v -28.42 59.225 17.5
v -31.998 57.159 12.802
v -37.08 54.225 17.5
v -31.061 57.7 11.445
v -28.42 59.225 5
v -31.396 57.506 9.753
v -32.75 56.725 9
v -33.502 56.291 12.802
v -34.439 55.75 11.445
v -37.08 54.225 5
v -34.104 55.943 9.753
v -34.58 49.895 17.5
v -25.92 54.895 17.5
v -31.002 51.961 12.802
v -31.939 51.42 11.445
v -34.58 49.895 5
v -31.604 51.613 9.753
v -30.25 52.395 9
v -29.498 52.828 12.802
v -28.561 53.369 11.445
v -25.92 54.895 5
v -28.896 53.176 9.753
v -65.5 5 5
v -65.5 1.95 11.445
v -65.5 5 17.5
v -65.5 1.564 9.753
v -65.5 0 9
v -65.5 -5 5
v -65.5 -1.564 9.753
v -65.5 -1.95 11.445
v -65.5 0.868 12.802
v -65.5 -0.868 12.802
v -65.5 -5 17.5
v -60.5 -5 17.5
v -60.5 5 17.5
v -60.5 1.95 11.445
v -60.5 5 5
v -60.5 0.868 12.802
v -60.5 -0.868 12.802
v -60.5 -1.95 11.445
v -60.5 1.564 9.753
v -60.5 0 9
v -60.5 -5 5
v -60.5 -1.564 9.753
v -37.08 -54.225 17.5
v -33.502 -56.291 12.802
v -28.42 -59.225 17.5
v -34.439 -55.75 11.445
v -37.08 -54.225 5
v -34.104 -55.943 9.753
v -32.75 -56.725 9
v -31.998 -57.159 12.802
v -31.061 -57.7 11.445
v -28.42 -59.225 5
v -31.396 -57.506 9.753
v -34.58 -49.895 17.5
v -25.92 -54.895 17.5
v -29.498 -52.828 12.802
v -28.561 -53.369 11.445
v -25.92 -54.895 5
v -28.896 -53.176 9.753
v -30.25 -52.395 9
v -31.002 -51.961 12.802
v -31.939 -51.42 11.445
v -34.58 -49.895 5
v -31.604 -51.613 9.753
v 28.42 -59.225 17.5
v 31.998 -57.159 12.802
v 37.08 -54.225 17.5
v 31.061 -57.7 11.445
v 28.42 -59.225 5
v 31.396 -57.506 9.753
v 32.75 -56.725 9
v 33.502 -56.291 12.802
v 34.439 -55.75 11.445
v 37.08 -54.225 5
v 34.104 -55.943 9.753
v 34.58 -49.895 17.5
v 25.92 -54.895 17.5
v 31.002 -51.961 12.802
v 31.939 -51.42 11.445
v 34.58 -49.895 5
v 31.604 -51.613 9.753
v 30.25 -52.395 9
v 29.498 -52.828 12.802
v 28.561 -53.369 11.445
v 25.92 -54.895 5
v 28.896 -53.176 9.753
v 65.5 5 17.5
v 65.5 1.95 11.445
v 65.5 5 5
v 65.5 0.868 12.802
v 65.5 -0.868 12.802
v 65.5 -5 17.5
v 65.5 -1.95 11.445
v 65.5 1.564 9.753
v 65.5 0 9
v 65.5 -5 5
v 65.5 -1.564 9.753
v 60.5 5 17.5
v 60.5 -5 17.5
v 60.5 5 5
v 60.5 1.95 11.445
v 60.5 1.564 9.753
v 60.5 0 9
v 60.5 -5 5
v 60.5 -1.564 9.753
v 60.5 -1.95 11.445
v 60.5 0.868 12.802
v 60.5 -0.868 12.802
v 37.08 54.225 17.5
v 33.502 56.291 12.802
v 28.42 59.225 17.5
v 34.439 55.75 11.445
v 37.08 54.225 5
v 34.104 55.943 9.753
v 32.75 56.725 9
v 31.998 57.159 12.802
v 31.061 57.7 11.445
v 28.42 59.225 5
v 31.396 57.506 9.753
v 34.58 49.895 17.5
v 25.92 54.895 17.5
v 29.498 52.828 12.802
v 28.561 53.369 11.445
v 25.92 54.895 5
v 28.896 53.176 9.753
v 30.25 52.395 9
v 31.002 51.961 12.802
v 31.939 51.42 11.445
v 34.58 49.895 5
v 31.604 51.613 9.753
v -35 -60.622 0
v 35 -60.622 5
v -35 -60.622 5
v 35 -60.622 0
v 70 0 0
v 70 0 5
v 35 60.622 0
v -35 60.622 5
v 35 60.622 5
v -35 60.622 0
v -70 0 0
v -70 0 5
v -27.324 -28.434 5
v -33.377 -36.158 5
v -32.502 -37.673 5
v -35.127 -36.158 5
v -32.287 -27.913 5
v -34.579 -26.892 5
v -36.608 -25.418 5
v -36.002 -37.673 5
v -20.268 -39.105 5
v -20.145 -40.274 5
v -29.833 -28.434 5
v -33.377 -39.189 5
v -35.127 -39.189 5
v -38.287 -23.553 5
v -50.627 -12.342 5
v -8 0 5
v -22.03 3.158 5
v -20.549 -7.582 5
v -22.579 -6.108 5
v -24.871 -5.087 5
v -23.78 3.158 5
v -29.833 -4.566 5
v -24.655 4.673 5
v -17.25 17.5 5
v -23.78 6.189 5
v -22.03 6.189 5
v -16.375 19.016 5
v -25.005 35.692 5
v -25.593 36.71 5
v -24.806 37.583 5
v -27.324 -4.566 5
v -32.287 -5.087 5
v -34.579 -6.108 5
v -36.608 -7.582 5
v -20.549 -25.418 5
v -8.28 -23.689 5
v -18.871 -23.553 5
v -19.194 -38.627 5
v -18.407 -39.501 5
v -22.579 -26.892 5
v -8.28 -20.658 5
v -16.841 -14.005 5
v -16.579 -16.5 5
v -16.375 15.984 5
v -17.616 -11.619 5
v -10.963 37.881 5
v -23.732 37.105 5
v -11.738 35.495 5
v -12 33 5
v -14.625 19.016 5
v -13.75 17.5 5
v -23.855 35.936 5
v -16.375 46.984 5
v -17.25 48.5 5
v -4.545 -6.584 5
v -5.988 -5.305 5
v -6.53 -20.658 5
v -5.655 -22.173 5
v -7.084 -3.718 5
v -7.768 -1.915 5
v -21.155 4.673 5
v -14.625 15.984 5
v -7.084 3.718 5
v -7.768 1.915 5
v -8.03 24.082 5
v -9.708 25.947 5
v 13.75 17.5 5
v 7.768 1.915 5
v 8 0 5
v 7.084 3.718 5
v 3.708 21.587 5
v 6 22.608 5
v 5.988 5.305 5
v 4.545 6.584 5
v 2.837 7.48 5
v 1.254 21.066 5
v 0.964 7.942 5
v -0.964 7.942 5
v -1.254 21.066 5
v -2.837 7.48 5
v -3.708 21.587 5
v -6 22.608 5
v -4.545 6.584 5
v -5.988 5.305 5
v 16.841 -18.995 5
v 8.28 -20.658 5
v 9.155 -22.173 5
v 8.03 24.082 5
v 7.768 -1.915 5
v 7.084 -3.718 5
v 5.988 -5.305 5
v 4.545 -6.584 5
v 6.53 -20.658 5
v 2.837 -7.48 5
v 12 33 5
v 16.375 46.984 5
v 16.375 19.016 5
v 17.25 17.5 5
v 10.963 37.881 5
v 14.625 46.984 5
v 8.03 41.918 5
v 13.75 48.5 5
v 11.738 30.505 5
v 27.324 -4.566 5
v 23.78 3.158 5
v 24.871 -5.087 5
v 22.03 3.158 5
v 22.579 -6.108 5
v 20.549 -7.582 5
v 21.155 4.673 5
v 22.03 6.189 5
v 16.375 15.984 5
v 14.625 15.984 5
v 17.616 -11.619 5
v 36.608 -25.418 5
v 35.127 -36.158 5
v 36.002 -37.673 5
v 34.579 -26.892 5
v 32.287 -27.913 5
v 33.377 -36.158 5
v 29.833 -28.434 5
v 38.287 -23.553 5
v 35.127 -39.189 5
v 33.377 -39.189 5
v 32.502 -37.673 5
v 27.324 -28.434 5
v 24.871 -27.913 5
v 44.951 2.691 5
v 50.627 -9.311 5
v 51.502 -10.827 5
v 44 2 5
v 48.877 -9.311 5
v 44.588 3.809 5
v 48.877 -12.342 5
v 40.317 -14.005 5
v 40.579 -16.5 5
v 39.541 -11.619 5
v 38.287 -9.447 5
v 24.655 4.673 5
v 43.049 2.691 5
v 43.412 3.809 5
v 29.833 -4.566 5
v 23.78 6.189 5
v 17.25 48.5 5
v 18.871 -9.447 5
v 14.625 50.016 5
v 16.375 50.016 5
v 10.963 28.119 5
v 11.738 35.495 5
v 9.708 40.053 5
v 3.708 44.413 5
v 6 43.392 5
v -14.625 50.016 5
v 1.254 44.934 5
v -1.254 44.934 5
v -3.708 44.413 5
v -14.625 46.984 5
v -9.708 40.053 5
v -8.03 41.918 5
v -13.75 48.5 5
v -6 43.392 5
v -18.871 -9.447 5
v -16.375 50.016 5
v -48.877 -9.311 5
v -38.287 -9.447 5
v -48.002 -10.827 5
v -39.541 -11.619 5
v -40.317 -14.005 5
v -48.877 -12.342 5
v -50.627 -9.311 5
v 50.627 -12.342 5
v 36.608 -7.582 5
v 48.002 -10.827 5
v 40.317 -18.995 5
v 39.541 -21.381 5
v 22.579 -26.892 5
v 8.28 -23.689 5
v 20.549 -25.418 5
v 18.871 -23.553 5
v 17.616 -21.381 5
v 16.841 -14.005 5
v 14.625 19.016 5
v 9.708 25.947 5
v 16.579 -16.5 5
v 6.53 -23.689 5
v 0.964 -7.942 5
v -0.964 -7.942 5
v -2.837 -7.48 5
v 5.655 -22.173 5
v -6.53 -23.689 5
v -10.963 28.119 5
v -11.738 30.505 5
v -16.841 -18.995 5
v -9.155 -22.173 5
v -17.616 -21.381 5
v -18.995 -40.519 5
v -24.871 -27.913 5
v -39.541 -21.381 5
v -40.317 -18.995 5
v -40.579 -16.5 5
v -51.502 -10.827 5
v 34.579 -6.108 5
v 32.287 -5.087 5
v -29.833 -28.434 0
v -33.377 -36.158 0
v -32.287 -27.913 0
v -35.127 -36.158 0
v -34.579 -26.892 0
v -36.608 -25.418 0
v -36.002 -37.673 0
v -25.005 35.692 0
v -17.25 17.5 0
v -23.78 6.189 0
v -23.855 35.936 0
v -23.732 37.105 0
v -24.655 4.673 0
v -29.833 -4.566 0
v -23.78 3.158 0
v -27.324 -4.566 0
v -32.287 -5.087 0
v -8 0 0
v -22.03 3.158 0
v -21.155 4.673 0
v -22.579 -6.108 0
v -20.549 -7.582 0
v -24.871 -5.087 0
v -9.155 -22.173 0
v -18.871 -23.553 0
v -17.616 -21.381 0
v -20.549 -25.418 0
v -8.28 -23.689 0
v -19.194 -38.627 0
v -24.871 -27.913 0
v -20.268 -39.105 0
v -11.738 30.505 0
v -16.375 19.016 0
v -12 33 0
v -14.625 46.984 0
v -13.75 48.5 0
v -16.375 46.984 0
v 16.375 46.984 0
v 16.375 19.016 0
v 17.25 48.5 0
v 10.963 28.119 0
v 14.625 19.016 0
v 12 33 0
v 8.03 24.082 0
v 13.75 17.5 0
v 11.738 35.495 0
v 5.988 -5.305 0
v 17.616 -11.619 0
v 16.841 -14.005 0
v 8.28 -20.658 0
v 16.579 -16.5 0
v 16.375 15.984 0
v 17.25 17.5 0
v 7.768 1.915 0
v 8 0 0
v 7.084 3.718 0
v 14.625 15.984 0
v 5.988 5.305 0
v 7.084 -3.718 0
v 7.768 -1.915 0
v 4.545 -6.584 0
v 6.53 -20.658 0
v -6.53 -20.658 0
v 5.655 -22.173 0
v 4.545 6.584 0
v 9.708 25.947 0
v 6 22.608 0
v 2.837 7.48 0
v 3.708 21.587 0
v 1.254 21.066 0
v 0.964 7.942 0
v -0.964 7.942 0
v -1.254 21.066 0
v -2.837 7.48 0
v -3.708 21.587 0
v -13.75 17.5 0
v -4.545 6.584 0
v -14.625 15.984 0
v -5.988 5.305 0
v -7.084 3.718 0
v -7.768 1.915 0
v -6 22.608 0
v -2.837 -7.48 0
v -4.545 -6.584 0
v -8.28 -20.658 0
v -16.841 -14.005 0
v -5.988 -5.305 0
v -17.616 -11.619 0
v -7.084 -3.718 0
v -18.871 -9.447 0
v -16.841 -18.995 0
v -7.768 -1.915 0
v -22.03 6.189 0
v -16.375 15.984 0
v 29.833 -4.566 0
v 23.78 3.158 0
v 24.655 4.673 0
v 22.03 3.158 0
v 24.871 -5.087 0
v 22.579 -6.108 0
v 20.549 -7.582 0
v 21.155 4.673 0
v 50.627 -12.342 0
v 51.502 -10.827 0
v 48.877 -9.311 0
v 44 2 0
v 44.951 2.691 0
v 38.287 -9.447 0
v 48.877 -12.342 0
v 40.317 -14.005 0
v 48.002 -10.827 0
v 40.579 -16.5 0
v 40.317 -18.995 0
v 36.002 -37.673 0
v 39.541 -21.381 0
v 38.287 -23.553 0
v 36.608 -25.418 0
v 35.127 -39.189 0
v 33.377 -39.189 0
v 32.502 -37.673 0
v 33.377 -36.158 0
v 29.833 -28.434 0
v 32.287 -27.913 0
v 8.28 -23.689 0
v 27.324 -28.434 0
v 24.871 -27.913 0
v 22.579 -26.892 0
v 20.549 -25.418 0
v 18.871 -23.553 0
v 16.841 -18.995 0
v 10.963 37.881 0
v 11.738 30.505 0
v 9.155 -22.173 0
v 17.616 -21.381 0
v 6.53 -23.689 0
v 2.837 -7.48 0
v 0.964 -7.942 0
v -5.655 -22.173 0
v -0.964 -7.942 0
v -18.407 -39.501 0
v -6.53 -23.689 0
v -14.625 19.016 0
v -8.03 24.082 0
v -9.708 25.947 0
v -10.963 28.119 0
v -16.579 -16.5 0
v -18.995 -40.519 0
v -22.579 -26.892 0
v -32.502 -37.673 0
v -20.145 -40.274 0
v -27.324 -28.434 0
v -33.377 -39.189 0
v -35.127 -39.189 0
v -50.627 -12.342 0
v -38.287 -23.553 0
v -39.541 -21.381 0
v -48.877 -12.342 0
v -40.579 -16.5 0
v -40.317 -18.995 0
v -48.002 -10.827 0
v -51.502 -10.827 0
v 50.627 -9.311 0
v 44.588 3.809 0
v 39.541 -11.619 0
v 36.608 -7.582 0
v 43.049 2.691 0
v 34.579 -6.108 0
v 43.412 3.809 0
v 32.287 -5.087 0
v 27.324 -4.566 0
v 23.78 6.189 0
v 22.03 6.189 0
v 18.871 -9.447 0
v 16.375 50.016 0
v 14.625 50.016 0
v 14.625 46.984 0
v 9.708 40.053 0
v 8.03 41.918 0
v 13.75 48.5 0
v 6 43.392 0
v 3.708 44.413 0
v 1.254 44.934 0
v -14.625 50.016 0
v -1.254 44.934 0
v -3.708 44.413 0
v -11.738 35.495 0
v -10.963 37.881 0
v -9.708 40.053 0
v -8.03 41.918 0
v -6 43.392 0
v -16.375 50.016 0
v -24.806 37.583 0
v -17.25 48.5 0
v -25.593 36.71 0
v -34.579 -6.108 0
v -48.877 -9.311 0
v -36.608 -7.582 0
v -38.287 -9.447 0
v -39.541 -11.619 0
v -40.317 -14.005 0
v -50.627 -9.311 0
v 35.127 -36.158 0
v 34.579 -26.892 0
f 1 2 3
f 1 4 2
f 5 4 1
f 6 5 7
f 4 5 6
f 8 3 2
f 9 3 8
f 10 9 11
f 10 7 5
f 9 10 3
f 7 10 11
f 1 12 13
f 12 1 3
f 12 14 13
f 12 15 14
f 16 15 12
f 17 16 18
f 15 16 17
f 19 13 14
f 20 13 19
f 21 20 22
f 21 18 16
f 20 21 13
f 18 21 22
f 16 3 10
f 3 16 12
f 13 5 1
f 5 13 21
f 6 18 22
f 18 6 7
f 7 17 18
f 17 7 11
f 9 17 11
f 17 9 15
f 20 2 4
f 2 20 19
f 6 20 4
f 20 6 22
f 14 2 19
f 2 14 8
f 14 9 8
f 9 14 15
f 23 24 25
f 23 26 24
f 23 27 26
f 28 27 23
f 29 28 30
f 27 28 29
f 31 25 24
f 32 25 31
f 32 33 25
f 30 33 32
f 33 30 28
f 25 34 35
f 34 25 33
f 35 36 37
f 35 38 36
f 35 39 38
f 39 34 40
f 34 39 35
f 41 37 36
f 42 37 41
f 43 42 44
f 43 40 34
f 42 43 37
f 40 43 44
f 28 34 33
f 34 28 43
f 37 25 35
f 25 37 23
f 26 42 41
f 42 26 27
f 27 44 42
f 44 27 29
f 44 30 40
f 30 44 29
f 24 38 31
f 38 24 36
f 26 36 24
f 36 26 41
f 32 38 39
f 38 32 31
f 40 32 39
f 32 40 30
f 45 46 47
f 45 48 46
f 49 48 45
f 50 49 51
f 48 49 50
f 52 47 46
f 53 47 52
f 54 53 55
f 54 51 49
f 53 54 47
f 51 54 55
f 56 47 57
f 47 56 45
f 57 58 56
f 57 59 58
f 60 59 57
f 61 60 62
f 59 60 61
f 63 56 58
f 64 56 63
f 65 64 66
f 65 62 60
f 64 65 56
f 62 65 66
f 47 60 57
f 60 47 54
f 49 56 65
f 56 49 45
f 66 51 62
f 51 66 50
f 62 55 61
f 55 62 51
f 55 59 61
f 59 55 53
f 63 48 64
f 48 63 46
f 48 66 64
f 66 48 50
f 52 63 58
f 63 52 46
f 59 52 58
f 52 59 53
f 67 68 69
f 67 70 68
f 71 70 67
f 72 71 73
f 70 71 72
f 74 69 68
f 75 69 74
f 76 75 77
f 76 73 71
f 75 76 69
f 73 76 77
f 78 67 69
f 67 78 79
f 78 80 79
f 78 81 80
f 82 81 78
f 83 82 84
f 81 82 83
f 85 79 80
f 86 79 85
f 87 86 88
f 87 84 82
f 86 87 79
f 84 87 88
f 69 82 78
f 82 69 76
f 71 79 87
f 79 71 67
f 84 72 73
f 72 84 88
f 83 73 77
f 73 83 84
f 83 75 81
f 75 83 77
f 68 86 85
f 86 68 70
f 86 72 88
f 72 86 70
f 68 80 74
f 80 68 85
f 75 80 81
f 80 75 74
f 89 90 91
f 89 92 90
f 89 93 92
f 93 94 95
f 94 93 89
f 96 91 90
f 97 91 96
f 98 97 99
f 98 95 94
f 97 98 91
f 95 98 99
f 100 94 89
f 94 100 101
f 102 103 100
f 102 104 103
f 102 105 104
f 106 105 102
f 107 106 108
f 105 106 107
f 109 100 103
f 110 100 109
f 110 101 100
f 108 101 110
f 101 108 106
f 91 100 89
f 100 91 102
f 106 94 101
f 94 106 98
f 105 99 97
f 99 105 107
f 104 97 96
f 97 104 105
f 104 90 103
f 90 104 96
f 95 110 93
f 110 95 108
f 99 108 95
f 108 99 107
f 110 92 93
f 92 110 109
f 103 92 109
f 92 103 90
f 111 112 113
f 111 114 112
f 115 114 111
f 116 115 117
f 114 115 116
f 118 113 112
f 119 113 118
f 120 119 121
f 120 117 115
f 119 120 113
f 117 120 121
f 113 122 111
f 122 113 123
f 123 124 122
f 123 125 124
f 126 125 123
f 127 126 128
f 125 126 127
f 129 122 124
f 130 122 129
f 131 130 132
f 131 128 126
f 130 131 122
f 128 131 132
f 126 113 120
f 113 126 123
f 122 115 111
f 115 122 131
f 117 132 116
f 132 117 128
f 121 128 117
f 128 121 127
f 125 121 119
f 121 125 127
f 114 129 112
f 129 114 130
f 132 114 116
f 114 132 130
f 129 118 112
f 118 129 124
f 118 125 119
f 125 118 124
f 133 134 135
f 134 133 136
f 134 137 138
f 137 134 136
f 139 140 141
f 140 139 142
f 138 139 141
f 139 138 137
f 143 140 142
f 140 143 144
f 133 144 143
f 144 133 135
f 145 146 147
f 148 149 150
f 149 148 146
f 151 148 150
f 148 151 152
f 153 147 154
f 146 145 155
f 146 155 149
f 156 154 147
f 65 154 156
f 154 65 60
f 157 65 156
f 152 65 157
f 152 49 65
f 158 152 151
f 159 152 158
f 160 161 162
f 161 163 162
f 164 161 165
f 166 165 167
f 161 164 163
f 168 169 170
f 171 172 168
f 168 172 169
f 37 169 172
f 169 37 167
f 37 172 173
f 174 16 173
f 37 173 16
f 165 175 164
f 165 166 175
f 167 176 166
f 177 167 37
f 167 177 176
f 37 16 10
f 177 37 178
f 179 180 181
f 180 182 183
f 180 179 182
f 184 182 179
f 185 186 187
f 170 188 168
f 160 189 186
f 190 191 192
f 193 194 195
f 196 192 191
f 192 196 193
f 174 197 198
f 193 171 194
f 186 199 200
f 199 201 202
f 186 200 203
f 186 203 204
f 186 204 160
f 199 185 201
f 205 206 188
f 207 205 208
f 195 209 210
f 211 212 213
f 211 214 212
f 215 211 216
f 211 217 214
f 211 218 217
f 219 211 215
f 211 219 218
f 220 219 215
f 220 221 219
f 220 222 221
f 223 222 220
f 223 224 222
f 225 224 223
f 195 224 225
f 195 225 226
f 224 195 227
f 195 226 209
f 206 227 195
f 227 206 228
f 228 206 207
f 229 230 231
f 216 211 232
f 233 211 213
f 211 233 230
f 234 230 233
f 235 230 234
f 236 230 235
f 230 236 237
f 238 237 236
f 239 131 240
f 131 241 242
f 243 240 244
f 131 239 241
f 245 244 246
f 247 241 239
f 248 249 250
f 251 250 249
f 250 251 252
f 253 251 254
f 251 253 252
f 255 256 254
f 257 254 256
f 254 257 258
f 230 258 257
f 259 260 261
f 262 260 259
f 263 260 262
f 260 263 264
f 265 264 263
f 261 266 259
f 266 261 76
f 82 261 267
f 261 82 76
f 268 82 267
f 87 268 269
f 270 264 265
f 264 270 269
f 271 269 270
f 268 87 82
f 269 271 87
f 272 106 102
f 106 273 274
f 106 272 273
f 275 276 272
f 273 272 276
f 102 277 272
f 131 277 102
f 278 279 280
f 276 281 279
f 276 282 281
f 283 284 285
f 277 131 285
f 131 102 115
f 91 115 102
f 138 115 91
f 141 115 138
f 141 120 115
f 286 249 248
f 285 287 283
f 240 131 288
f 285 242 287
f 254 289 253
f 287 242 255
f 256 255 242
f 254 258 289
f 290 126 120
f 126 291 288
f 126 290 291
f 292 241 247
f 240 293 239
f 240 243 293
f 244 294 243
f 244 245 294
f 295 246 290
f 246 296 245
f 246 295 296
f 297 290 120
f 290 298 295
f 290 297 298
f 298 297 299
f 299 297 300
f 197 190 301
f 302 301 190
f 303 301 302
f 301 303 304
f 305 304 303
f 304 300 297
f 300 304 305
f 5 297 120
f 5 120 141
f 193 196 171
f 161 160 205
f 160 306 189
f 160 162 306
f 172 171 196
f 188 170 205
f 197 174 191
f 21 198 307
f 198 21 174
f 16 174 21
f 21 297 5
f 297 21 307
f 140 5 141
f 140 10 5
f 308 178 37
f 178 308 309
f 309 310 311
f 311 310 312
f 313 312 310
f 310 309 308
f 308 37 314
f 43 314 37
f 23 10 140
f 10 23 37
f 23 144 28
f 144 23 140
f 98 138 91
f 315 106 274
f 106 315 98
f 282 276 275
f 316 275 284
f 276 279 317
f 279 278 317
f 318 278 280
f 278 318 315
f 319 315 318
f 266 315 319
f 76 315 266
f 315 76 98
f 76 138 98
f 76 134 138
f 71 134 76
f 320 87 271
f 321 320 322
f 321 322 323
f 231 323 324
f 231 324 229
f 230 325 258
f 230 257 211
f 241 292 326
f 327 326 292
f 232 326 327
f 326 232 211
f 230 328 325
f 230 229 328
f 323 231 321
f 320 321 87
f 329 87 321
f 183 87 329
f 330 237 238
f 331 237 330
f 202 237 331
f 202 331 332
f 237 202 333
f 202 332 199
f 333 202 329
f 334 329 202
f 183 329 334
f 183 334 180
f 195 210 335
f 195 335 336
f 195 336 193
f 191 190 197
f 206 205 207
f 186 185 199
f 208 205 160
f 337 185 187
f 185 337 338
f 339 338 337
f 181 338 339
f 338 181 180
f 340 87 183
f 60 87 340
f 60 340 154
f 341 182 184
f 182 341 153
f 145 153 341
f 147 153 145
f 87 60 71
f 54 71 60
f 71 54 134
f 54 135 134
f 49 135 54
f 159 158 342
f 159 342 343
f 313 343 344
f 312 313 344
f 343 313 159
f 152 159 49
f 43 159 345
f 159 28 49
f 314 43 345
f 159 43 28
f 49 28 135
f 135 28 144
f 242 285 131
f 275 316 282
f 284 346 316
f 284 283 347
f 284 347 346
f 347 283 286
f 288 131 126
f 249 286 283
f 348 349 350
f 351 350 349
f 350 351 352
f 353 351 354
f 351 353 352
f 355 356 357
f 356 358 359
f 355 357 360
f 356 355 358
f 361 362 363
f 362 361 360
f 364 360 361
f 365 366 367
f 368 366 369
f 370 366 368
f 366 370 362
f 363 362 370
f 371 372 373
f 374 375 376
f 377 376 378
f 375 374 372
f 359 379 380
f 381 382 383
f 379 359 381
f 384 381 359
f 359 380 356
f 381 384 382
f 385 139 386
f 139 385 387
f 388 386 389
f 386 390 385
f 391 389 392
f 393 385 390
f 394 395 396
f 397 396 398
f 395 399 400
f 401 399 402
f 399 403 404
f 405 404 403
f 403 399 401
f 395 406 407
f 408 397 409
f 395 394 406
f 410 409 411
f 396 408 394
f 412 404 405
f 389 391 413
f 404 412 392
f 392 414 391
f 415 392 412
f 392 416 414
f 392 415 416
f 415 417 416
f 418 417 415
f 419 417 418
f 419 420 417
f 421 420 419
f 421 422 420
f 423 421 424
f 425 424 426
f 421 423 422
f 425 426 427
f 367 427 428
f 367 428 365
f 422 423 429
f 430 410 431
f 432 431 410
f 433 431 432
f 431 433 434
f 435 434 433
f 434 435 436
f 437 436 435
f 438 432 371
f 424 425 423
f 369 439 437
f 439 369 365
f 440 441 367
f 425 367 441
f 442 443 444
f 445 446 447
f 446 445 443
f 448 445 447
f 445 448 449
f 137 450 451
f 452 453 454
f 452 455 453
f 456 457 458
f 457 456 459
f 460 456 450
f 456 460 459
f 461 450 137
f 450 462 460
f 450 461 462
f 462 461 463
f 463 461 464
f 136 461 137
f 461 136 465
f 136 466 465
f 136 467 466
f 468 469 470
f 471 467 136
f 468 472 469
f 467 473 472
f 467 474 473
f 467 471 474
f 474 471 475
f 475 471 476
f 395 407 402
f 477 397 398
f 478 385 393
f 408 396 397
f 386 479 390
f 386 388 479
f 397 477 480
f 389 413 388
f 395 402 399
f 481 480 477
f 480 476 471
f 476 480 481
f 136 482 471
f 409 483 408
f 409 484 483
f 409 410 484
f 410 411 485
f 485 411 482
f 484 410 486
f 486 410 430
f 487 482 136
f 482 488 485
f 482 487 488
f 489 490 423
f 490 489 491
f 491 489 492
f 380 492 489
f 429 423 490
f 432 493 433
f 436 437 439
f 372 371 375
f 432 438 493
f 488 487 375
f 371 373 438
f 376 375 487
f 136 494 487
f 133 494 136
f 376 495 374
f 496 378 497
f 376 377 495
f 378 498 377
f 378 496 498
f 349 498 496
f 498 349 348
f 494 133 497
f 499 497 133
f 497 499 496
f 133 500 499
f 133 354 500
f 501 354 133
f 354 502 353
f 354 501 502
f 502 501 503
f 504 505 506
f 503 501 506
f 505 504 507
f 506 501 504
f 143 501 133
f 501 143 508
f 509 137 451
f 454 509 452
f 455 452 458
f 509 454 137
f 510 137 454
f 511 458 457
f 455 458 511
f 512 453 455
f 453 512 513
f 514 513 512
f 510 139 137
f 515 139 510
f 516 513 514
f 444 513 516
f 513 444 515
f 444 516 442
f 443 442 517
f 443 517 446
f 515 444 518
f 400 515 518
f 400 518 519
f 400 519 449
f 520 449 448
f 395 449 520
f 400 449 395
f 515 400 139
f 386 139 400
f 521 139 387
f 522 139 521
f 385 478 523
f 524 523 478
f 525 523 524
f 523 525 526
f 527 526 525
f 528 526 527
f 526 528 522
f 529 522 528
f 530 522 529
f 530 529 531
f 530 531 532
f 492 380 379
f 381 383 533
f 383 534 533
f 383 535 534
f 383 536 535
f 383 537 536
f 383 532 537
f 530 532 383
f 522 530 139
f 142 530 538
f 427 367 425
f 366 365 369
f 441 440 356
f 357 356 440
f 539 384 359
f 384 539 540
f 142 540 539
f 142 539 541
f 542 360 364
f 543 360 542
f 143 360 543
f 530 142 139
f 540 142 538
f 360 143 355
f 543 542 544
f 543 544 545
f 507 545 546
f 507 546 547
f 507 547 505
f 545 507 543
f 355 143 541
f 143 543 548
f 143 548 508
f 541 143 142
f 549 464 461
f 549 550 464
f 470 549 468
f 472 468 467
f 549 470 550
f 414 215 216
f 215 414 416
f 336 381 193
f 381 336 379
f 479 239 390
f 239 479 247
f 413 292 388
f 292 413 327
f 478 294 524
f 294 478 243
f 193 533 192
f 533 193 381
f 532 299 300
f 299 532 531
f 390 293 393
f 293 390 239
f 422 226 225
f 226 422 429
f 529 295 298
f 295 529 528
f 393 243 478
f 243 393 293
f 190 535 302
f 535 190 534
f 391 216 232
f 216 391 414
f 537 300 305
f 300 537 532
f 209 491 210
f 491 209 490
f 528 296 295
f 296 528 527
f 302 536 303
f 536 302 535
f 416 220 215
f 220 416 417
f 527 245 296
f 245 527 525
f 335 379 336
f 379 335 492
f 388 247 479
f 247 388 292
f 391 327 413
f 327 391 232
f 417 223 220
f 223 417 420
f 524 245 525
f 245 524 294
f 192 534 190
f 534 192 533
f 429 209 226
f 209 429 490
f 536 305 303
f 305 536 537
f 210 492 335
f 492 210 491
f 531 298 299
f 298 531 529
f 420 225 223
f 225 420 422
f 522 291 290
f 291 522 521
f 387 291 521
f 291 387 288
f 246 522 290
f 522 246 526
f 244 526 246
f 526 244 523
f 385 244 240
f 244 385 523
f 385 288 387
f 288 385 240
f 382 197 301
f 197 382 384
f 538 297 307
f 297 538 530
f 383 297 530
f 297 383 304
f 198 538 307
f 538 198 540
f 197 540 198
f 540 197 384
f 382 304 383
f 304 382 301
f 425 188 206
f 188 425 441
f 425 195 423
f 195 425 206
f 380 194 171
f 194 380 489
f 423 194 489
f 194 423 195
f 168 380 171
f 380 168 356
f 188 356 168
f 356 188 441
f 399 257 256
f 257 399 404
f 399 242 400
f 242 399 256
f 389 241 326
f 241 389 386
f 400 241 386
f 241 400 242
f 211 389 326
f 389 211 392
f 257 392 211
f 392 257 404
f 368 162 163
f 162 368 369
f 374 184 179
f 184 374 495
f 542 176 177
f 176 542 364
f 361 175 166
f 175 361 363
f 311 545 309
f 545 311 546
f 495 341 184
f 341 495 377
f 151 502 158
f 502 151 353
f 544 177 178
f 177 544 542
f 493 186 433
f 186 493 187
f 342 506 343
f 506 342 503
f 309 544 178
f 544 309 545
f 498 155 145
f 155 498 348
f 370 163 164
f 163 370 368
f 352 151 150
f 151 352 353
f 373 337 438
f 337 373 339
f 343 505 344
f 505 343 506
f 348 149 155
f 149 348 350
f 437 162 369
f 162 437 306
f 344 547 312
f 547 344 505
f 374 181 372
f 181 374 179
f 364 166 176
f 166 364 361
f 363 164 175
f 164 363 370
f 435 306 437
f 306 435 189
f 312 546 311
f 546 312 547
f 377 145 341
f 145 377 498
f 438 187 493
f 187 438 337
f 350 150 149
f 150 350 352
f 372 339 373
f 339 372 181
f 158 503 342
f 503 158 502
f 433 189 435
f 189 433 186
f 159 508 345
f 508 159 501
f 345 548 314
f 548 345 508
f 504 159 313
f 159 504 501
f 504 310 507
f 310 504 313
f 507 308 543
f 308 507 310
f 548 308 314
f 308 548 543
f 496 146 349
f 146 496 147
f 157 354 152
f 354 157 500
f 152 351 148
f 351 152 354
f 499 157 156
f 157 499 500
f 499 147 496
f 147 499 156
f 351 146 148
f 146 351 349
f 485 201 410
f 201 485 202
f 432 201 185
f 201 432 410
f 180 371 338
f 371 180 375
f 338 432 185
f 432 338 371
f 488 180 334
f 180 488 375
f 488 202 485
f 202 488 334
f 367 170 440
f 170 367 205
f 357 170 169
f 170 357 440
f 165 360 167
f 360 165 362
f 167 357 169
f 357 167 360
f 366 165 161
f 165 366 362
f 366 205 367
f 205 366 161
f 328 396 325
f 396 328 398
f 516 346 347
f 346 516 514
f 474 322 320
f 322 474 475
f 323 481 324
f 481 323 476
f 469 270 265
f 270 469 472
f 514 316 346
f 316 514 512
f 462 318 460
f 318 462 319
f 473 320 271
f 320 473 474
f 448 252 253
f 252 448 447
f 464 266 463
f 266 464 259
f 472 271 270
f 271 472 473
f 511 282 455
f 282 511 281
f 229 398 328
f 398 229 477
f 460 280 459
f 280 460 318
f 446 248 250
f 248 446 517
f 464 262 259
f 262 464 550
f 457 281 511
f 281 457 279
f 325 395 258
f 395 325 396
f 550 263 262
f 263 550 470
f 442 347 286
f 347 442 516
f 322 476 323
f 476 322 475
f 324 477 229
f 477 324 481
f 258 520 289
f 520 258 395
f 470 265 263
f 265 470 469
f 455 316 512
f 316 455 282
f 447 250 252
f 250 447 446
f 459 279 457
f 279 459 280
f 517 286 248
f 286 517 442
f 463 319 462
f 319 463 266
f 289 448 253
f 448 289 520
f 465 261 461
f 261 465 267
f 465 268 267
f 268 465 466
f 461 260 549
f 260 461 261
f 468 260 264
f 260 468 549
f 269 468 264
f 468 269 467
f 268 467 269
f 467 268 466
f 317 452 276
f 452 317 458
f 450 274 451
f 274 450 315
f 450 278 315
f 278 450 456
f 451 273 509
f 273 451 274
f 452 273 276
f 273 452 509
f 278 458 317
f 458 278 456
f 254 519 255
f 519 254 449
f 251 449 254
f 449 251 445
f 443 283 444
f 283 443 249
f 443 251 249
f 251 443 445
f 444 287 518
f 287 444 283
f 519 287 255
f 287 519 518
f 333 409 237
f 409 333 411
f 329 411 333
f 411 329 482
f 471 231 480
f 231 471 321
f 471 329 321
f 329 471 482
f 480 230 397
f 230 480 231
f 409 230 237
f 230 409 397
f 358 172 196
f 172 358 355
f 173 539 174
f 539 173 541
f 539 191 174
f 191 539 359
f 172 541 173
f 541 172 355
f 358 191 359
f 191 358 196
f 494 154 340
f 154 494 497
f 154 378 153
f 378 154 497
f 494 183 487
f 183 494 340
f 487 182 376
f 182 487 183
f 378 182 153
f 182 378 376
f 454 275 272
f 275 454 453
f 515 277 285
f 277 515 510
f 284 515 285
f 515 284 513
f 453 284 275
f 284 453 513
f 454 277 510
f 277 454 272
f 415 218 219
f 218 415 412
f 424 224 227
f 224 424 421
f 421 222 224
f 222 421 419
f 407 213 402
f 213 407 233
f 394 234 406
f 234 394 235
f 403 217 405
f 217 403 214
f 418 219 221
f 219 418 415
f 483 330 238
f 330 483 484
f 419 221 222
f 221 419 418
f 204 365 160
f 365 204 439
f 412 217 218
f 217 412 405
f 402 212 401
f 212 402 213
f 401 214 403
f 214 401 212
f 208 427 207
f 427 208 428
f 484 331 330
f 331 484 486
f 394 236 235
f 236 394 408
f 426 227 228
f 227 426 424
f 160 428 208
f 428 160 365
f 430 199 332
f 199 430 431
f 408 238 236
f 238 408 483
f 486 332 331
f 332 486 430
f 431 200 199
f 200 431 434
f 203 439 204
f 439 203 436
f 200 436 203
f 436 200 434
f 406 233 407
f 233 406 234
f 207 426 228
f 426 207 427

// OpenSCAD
// file: rampsMount.scad
module rampsMount()
{
	translate([6.54, 17.24, 0])
        cylinder(r=3.5, h=3.5);
    translate([54.8, 15.97, 0])
        cylinder(r=3.5, h=3.5);
    translate([6.54, 92.17, 0])
        cylinder(r=3.5, h=3.5);
    translate([54.8, 98.52, 0])
        cylinder(r=3.5, h=3.5);
}
module mountHoles()
{
    translate([6.54, 17.24, -3])
        cylinder(r=1.6, h=20);
    translate([54.8, 15.97, -3])
        cylinder(r=1.6, h=20);
    translate([54.8, 98.52, -3])
        cylinder(r=1.6, h=20);
    translate([6.54, 17.24, -3])
        cylinder(r=3.5, h=3, $fn=6);
    translate([54.8, 15.97, -3])
        cylinder(r=3.5, h=3, $fn=6);
    translate([54.8, 98.52, -3])
        cylinder(r=3.5, h=3, $fn=6);
}
//rampsMount();
//mountHoles();
// file: utl.NEMA.scad
// Model: NEMA23
// Model: NEMA17
// Author: Bogdan Kecman
// Licence: GPL
//
// Usage:
// nema17(1); //nema17 double shaft
//nema17(); //nema17 siingle shaft
// nema23(1, 1); //nema23 double shaft cylinder
// nema23(1); //nema23 double shaft cube
// nema23(); //nema23 single shaft cube
// nema23(0,1); //nema23 single shaft cylinder
//nema17DiffBlock();  //nema 17 block for subtracting to make mounts


module nema23(has_back, is_cylinder){
  mplate = 56.9; //mounting plate width
  mplateH = 5.3; //mounting plate height

  ringR = 38.10 / 2; //ring radius
  ringH = 1.3; //ring thickness

  shaftR = 6.337/2; //shaft radius
  shaftH = 20.6;  //shaft lenght

  bodyL = 46.5; //46.5, 56.1, 77.7, 103.1, ...
  bodyInnerCube = 37.6;

  holeR = 5.21/2;
  holeL = 47.14/2; //distance between hole centres

  difference(){
    union(){
      //mounting plate
      color([0.7,0.7,0.7]) cube(size = [mplate,mplate,mplateH], center = true);
      //ring
      color([0.7,0.7,0.7]) translate(v=[0,0,mplateH/2+ringH/2]) cylinder(r=ringR, h=ringH, center=true);
      //shaft front
      color([0.9,0.9,0.9]) translate(v=[0,0,mplateH/2+ringH+shaftH/2])cylinder(r=shaftR, h=shaftH, center=true);
      if (has_back == 1){
        color([0.9,0.9,0.9])  translate(v=[0,0,0-bodyL-shaftH/2]) cylinder(r=shaftR, h=shaftH, center=true);
      }
      //body
      if (is_cylinder == 1){
        color([0.1,0.1,0.1]) translate(v=[0,0,0-mplateH/2-bodyL/2]) cylinder(r=mplate/2, h=bodyL, center=true);
      }else{
        union(){
          color([0.1,0.1,0.1]) translate(v=[0,0,0-mplateH/2-bodyL/2]) cube(size = [bodyInnerCube, mplate, bodyL], center=true);
          color([0.1,0.1,0.1]) translate(v=[0,0,0-mplateH/2-bodyL/2]) cube(size = [mplate,bodyInnerCube, bodyL], center=true);
        }
      }
    }
    translate(v=[holeL,holeL,0]) cylinder(r = holeR, h = 2*mplateH, center=true);
    translate(v=[-holeL,holeL,0]) cylinder(r = holeR, h = 2*mplateH, center=true);
    translate(v=[-holeL,-holeL,0]) cylinder(r = holeR, h = 2*mplateH, center=true);
    translate(v=[holeL,-holeL,0]) cylinder(r = holeR, h = 2*mplateH, center=true);
  }
  
}

module nema17(has_back, is_cylinder){
  mplate = 42.67; //mounting plate width
  mplateH = 0; //mounting plate height

  ringR = 22 / 2; //ring radius, can be 21.95/2
  ringH = 2; //ring thickness

  shaftR = 5/2; //shaft radius, can be 4.988/2
  shaftH = 20.07;  //shaft lenght

  bodyL = 46.5; //25.3, 33.13, 34.7, 40.9, 47.0, ...

  holeR = 3.5/2; //M3 or M4 or #4-40
  holeL = 31.0/2; //distance between hole centres

  difference(){
    union(){
      //ring
      color([0.7,0.7,0.7]) translate(v=[0,0,ringH/2]) cylinder(r=ringR, h=ringH, center=true);
      //shaft front
      color([0.9,0.9,0.9]) translate(v=[0,0,ringH+shaftH/2])cylinder(r=shaftR, h=shaftH, center=true);
      if (has_back == 1){
        color([0.9,0.9,0.9]) translate(v=[0,0,0-bodyL-shaftH/2]) cylinder(r=shaftR, h=shaftH, center=true);
      }
      //body
      if (is_cylinder == 1){
        color([0.1,0.1,0.1]) translate(v=[0,0,0-bodyL/2]) cylinder(r=mplate/2*1.2, h=bodyL, center=true);
      }else{
        union(){
          color([0.1,0.1,0.1]) translate(v=[0,0,0-bodyL/2]) cube(size = [mplate, mplate, bodyL], center=true);
          color([0.1,0.1,0.1]) translate(v=[0,0,0-bodyL/2]) cube(size = [mplate, mplate, bodyL], center=true);
        }
      }
    }
    translate(v=[holeL,holeL,0-bodyL/2]) cylinder(r = holeR, h = bodyL+10, center=true);
    translate(v=[-holeL,holeL,0-bodyL/2]) cylinder(r = holeR, h = bodyL+10, center=true);
    translate(v=[-holeL,-holeL,0-bodyL/2]) cylinder(r = holeR, h = bodyL+10, center=true);
    translate(v=[holeL,-holeL,0-bodyL/2]) cylinder(r = holeR, h = bodyL+10, center=true);
  }
  
}
module nema17DiffBlock(){
  mplate = 42.67; //mounting plate width
  mplateH = 0; //mounting plate height

  ringR = 22 / 2; //ring radius, can be 21.95/2
  ringH = 2; //ring thickness

  shaftR = 5/2; //shaft radius, can be 4.988/2
  shaftH = 20.07;  //shaft lenght

  bodyL = 46.5; //25.3, 33.13, 34.7, 40.9, 47.0, ...

  holeR = 3.5/2; //M3 or M4 or #4-40
  holeL = 31.0/2; //distance between hole centres

  
  
      //ring
    color([0.7,0.7,0.7]) translate(v=[0,0,ringH/2]) cylinder(r=ringR+1, h=ringH+30, center=true);
      
    translate(v=[holeL,holeL,0-bodyL/2]) cylinder(r = holeR, h = bodyL+40, center=true);
    translate(v=[-holeL,holeL,0-bodyL/2]) cylinder(r = holeR, h = bodyL+40, center=true);
    translate(v=[-holeL,-holeL,0-bodyL/2]) cylinder(r = holeR, h = bodyL+40, center=true);
    translate(v=[holeL,-holeL,0-bodyL/2]) cylinder(r = holeR, h = bodyL+40, center=true);
  
  
}
// main file
 include <utl.NEMA.scad>
include <rampsMount.scad>
module printerBody(){

    difference(){
        union(){
            //MainBody
            cylinder($fn=6, h=5, r=70);
            
            //TopLineAnchors
                rotate(30, [0, 0, 1])
               for ( i = [0 : 5] ){
                  rotate( i * 60, [0, 0, 1])
                    translate([0,63,10]){
                        rotate(90 , [0,0,1])
                            difference(){
                                cube([5,10,15], center=true);
                                rotate([0,90,0]){
                                    translate([-1,0,-6]){
                                        cylinder(h=12, r=2);
                                    }
                                }
                            }
                        }
                }
        }
        //center hole
        translate([0,0,-1]){
            cylinder(h=7, r=8);
        }
        //StepperMounts
            for ( i = [0 : 2] ){
                    rotate( i * 120, [0, 0, 30])
                    translate([0,33,3]){
                        rotate([0,0,0]){
                            nema17DiffBlock();
                            //#nema17();   
                        }
                    }
            }
            //tensioning pins
            rotate(30,[0,0,1])
            for ( i = [0 : 2] ){
                    rotate( i * 120, [0, 0, 30])
                    translate([-3,44,-4]){
                        rotate([0,0,0]){
                            cylinder(h=10, r=1);  
                        }
                    }
            }
    }
}
module spool(){
    difference(){
        union(){
            //near flange
            translate([0,0,9])
                cylinder(d1=19,d2=14, h=5);
            //far flange
            translate([0,0,29])
                cylinder(d=19, h=3);
            difference(){
                //outer spool part
                translate([0,0,.1])
                   cylinder($fn=64, d=14, h=30);
                //inner spool cutout
               cylinder($fn=20, d=12, h=14); 
           }
       }
       //stringhole
       rotate([0,90,0])
       translate([-14,0,-15])
       cylinder(d=2, h=40);
    }
}

printerBody();
//spool();
